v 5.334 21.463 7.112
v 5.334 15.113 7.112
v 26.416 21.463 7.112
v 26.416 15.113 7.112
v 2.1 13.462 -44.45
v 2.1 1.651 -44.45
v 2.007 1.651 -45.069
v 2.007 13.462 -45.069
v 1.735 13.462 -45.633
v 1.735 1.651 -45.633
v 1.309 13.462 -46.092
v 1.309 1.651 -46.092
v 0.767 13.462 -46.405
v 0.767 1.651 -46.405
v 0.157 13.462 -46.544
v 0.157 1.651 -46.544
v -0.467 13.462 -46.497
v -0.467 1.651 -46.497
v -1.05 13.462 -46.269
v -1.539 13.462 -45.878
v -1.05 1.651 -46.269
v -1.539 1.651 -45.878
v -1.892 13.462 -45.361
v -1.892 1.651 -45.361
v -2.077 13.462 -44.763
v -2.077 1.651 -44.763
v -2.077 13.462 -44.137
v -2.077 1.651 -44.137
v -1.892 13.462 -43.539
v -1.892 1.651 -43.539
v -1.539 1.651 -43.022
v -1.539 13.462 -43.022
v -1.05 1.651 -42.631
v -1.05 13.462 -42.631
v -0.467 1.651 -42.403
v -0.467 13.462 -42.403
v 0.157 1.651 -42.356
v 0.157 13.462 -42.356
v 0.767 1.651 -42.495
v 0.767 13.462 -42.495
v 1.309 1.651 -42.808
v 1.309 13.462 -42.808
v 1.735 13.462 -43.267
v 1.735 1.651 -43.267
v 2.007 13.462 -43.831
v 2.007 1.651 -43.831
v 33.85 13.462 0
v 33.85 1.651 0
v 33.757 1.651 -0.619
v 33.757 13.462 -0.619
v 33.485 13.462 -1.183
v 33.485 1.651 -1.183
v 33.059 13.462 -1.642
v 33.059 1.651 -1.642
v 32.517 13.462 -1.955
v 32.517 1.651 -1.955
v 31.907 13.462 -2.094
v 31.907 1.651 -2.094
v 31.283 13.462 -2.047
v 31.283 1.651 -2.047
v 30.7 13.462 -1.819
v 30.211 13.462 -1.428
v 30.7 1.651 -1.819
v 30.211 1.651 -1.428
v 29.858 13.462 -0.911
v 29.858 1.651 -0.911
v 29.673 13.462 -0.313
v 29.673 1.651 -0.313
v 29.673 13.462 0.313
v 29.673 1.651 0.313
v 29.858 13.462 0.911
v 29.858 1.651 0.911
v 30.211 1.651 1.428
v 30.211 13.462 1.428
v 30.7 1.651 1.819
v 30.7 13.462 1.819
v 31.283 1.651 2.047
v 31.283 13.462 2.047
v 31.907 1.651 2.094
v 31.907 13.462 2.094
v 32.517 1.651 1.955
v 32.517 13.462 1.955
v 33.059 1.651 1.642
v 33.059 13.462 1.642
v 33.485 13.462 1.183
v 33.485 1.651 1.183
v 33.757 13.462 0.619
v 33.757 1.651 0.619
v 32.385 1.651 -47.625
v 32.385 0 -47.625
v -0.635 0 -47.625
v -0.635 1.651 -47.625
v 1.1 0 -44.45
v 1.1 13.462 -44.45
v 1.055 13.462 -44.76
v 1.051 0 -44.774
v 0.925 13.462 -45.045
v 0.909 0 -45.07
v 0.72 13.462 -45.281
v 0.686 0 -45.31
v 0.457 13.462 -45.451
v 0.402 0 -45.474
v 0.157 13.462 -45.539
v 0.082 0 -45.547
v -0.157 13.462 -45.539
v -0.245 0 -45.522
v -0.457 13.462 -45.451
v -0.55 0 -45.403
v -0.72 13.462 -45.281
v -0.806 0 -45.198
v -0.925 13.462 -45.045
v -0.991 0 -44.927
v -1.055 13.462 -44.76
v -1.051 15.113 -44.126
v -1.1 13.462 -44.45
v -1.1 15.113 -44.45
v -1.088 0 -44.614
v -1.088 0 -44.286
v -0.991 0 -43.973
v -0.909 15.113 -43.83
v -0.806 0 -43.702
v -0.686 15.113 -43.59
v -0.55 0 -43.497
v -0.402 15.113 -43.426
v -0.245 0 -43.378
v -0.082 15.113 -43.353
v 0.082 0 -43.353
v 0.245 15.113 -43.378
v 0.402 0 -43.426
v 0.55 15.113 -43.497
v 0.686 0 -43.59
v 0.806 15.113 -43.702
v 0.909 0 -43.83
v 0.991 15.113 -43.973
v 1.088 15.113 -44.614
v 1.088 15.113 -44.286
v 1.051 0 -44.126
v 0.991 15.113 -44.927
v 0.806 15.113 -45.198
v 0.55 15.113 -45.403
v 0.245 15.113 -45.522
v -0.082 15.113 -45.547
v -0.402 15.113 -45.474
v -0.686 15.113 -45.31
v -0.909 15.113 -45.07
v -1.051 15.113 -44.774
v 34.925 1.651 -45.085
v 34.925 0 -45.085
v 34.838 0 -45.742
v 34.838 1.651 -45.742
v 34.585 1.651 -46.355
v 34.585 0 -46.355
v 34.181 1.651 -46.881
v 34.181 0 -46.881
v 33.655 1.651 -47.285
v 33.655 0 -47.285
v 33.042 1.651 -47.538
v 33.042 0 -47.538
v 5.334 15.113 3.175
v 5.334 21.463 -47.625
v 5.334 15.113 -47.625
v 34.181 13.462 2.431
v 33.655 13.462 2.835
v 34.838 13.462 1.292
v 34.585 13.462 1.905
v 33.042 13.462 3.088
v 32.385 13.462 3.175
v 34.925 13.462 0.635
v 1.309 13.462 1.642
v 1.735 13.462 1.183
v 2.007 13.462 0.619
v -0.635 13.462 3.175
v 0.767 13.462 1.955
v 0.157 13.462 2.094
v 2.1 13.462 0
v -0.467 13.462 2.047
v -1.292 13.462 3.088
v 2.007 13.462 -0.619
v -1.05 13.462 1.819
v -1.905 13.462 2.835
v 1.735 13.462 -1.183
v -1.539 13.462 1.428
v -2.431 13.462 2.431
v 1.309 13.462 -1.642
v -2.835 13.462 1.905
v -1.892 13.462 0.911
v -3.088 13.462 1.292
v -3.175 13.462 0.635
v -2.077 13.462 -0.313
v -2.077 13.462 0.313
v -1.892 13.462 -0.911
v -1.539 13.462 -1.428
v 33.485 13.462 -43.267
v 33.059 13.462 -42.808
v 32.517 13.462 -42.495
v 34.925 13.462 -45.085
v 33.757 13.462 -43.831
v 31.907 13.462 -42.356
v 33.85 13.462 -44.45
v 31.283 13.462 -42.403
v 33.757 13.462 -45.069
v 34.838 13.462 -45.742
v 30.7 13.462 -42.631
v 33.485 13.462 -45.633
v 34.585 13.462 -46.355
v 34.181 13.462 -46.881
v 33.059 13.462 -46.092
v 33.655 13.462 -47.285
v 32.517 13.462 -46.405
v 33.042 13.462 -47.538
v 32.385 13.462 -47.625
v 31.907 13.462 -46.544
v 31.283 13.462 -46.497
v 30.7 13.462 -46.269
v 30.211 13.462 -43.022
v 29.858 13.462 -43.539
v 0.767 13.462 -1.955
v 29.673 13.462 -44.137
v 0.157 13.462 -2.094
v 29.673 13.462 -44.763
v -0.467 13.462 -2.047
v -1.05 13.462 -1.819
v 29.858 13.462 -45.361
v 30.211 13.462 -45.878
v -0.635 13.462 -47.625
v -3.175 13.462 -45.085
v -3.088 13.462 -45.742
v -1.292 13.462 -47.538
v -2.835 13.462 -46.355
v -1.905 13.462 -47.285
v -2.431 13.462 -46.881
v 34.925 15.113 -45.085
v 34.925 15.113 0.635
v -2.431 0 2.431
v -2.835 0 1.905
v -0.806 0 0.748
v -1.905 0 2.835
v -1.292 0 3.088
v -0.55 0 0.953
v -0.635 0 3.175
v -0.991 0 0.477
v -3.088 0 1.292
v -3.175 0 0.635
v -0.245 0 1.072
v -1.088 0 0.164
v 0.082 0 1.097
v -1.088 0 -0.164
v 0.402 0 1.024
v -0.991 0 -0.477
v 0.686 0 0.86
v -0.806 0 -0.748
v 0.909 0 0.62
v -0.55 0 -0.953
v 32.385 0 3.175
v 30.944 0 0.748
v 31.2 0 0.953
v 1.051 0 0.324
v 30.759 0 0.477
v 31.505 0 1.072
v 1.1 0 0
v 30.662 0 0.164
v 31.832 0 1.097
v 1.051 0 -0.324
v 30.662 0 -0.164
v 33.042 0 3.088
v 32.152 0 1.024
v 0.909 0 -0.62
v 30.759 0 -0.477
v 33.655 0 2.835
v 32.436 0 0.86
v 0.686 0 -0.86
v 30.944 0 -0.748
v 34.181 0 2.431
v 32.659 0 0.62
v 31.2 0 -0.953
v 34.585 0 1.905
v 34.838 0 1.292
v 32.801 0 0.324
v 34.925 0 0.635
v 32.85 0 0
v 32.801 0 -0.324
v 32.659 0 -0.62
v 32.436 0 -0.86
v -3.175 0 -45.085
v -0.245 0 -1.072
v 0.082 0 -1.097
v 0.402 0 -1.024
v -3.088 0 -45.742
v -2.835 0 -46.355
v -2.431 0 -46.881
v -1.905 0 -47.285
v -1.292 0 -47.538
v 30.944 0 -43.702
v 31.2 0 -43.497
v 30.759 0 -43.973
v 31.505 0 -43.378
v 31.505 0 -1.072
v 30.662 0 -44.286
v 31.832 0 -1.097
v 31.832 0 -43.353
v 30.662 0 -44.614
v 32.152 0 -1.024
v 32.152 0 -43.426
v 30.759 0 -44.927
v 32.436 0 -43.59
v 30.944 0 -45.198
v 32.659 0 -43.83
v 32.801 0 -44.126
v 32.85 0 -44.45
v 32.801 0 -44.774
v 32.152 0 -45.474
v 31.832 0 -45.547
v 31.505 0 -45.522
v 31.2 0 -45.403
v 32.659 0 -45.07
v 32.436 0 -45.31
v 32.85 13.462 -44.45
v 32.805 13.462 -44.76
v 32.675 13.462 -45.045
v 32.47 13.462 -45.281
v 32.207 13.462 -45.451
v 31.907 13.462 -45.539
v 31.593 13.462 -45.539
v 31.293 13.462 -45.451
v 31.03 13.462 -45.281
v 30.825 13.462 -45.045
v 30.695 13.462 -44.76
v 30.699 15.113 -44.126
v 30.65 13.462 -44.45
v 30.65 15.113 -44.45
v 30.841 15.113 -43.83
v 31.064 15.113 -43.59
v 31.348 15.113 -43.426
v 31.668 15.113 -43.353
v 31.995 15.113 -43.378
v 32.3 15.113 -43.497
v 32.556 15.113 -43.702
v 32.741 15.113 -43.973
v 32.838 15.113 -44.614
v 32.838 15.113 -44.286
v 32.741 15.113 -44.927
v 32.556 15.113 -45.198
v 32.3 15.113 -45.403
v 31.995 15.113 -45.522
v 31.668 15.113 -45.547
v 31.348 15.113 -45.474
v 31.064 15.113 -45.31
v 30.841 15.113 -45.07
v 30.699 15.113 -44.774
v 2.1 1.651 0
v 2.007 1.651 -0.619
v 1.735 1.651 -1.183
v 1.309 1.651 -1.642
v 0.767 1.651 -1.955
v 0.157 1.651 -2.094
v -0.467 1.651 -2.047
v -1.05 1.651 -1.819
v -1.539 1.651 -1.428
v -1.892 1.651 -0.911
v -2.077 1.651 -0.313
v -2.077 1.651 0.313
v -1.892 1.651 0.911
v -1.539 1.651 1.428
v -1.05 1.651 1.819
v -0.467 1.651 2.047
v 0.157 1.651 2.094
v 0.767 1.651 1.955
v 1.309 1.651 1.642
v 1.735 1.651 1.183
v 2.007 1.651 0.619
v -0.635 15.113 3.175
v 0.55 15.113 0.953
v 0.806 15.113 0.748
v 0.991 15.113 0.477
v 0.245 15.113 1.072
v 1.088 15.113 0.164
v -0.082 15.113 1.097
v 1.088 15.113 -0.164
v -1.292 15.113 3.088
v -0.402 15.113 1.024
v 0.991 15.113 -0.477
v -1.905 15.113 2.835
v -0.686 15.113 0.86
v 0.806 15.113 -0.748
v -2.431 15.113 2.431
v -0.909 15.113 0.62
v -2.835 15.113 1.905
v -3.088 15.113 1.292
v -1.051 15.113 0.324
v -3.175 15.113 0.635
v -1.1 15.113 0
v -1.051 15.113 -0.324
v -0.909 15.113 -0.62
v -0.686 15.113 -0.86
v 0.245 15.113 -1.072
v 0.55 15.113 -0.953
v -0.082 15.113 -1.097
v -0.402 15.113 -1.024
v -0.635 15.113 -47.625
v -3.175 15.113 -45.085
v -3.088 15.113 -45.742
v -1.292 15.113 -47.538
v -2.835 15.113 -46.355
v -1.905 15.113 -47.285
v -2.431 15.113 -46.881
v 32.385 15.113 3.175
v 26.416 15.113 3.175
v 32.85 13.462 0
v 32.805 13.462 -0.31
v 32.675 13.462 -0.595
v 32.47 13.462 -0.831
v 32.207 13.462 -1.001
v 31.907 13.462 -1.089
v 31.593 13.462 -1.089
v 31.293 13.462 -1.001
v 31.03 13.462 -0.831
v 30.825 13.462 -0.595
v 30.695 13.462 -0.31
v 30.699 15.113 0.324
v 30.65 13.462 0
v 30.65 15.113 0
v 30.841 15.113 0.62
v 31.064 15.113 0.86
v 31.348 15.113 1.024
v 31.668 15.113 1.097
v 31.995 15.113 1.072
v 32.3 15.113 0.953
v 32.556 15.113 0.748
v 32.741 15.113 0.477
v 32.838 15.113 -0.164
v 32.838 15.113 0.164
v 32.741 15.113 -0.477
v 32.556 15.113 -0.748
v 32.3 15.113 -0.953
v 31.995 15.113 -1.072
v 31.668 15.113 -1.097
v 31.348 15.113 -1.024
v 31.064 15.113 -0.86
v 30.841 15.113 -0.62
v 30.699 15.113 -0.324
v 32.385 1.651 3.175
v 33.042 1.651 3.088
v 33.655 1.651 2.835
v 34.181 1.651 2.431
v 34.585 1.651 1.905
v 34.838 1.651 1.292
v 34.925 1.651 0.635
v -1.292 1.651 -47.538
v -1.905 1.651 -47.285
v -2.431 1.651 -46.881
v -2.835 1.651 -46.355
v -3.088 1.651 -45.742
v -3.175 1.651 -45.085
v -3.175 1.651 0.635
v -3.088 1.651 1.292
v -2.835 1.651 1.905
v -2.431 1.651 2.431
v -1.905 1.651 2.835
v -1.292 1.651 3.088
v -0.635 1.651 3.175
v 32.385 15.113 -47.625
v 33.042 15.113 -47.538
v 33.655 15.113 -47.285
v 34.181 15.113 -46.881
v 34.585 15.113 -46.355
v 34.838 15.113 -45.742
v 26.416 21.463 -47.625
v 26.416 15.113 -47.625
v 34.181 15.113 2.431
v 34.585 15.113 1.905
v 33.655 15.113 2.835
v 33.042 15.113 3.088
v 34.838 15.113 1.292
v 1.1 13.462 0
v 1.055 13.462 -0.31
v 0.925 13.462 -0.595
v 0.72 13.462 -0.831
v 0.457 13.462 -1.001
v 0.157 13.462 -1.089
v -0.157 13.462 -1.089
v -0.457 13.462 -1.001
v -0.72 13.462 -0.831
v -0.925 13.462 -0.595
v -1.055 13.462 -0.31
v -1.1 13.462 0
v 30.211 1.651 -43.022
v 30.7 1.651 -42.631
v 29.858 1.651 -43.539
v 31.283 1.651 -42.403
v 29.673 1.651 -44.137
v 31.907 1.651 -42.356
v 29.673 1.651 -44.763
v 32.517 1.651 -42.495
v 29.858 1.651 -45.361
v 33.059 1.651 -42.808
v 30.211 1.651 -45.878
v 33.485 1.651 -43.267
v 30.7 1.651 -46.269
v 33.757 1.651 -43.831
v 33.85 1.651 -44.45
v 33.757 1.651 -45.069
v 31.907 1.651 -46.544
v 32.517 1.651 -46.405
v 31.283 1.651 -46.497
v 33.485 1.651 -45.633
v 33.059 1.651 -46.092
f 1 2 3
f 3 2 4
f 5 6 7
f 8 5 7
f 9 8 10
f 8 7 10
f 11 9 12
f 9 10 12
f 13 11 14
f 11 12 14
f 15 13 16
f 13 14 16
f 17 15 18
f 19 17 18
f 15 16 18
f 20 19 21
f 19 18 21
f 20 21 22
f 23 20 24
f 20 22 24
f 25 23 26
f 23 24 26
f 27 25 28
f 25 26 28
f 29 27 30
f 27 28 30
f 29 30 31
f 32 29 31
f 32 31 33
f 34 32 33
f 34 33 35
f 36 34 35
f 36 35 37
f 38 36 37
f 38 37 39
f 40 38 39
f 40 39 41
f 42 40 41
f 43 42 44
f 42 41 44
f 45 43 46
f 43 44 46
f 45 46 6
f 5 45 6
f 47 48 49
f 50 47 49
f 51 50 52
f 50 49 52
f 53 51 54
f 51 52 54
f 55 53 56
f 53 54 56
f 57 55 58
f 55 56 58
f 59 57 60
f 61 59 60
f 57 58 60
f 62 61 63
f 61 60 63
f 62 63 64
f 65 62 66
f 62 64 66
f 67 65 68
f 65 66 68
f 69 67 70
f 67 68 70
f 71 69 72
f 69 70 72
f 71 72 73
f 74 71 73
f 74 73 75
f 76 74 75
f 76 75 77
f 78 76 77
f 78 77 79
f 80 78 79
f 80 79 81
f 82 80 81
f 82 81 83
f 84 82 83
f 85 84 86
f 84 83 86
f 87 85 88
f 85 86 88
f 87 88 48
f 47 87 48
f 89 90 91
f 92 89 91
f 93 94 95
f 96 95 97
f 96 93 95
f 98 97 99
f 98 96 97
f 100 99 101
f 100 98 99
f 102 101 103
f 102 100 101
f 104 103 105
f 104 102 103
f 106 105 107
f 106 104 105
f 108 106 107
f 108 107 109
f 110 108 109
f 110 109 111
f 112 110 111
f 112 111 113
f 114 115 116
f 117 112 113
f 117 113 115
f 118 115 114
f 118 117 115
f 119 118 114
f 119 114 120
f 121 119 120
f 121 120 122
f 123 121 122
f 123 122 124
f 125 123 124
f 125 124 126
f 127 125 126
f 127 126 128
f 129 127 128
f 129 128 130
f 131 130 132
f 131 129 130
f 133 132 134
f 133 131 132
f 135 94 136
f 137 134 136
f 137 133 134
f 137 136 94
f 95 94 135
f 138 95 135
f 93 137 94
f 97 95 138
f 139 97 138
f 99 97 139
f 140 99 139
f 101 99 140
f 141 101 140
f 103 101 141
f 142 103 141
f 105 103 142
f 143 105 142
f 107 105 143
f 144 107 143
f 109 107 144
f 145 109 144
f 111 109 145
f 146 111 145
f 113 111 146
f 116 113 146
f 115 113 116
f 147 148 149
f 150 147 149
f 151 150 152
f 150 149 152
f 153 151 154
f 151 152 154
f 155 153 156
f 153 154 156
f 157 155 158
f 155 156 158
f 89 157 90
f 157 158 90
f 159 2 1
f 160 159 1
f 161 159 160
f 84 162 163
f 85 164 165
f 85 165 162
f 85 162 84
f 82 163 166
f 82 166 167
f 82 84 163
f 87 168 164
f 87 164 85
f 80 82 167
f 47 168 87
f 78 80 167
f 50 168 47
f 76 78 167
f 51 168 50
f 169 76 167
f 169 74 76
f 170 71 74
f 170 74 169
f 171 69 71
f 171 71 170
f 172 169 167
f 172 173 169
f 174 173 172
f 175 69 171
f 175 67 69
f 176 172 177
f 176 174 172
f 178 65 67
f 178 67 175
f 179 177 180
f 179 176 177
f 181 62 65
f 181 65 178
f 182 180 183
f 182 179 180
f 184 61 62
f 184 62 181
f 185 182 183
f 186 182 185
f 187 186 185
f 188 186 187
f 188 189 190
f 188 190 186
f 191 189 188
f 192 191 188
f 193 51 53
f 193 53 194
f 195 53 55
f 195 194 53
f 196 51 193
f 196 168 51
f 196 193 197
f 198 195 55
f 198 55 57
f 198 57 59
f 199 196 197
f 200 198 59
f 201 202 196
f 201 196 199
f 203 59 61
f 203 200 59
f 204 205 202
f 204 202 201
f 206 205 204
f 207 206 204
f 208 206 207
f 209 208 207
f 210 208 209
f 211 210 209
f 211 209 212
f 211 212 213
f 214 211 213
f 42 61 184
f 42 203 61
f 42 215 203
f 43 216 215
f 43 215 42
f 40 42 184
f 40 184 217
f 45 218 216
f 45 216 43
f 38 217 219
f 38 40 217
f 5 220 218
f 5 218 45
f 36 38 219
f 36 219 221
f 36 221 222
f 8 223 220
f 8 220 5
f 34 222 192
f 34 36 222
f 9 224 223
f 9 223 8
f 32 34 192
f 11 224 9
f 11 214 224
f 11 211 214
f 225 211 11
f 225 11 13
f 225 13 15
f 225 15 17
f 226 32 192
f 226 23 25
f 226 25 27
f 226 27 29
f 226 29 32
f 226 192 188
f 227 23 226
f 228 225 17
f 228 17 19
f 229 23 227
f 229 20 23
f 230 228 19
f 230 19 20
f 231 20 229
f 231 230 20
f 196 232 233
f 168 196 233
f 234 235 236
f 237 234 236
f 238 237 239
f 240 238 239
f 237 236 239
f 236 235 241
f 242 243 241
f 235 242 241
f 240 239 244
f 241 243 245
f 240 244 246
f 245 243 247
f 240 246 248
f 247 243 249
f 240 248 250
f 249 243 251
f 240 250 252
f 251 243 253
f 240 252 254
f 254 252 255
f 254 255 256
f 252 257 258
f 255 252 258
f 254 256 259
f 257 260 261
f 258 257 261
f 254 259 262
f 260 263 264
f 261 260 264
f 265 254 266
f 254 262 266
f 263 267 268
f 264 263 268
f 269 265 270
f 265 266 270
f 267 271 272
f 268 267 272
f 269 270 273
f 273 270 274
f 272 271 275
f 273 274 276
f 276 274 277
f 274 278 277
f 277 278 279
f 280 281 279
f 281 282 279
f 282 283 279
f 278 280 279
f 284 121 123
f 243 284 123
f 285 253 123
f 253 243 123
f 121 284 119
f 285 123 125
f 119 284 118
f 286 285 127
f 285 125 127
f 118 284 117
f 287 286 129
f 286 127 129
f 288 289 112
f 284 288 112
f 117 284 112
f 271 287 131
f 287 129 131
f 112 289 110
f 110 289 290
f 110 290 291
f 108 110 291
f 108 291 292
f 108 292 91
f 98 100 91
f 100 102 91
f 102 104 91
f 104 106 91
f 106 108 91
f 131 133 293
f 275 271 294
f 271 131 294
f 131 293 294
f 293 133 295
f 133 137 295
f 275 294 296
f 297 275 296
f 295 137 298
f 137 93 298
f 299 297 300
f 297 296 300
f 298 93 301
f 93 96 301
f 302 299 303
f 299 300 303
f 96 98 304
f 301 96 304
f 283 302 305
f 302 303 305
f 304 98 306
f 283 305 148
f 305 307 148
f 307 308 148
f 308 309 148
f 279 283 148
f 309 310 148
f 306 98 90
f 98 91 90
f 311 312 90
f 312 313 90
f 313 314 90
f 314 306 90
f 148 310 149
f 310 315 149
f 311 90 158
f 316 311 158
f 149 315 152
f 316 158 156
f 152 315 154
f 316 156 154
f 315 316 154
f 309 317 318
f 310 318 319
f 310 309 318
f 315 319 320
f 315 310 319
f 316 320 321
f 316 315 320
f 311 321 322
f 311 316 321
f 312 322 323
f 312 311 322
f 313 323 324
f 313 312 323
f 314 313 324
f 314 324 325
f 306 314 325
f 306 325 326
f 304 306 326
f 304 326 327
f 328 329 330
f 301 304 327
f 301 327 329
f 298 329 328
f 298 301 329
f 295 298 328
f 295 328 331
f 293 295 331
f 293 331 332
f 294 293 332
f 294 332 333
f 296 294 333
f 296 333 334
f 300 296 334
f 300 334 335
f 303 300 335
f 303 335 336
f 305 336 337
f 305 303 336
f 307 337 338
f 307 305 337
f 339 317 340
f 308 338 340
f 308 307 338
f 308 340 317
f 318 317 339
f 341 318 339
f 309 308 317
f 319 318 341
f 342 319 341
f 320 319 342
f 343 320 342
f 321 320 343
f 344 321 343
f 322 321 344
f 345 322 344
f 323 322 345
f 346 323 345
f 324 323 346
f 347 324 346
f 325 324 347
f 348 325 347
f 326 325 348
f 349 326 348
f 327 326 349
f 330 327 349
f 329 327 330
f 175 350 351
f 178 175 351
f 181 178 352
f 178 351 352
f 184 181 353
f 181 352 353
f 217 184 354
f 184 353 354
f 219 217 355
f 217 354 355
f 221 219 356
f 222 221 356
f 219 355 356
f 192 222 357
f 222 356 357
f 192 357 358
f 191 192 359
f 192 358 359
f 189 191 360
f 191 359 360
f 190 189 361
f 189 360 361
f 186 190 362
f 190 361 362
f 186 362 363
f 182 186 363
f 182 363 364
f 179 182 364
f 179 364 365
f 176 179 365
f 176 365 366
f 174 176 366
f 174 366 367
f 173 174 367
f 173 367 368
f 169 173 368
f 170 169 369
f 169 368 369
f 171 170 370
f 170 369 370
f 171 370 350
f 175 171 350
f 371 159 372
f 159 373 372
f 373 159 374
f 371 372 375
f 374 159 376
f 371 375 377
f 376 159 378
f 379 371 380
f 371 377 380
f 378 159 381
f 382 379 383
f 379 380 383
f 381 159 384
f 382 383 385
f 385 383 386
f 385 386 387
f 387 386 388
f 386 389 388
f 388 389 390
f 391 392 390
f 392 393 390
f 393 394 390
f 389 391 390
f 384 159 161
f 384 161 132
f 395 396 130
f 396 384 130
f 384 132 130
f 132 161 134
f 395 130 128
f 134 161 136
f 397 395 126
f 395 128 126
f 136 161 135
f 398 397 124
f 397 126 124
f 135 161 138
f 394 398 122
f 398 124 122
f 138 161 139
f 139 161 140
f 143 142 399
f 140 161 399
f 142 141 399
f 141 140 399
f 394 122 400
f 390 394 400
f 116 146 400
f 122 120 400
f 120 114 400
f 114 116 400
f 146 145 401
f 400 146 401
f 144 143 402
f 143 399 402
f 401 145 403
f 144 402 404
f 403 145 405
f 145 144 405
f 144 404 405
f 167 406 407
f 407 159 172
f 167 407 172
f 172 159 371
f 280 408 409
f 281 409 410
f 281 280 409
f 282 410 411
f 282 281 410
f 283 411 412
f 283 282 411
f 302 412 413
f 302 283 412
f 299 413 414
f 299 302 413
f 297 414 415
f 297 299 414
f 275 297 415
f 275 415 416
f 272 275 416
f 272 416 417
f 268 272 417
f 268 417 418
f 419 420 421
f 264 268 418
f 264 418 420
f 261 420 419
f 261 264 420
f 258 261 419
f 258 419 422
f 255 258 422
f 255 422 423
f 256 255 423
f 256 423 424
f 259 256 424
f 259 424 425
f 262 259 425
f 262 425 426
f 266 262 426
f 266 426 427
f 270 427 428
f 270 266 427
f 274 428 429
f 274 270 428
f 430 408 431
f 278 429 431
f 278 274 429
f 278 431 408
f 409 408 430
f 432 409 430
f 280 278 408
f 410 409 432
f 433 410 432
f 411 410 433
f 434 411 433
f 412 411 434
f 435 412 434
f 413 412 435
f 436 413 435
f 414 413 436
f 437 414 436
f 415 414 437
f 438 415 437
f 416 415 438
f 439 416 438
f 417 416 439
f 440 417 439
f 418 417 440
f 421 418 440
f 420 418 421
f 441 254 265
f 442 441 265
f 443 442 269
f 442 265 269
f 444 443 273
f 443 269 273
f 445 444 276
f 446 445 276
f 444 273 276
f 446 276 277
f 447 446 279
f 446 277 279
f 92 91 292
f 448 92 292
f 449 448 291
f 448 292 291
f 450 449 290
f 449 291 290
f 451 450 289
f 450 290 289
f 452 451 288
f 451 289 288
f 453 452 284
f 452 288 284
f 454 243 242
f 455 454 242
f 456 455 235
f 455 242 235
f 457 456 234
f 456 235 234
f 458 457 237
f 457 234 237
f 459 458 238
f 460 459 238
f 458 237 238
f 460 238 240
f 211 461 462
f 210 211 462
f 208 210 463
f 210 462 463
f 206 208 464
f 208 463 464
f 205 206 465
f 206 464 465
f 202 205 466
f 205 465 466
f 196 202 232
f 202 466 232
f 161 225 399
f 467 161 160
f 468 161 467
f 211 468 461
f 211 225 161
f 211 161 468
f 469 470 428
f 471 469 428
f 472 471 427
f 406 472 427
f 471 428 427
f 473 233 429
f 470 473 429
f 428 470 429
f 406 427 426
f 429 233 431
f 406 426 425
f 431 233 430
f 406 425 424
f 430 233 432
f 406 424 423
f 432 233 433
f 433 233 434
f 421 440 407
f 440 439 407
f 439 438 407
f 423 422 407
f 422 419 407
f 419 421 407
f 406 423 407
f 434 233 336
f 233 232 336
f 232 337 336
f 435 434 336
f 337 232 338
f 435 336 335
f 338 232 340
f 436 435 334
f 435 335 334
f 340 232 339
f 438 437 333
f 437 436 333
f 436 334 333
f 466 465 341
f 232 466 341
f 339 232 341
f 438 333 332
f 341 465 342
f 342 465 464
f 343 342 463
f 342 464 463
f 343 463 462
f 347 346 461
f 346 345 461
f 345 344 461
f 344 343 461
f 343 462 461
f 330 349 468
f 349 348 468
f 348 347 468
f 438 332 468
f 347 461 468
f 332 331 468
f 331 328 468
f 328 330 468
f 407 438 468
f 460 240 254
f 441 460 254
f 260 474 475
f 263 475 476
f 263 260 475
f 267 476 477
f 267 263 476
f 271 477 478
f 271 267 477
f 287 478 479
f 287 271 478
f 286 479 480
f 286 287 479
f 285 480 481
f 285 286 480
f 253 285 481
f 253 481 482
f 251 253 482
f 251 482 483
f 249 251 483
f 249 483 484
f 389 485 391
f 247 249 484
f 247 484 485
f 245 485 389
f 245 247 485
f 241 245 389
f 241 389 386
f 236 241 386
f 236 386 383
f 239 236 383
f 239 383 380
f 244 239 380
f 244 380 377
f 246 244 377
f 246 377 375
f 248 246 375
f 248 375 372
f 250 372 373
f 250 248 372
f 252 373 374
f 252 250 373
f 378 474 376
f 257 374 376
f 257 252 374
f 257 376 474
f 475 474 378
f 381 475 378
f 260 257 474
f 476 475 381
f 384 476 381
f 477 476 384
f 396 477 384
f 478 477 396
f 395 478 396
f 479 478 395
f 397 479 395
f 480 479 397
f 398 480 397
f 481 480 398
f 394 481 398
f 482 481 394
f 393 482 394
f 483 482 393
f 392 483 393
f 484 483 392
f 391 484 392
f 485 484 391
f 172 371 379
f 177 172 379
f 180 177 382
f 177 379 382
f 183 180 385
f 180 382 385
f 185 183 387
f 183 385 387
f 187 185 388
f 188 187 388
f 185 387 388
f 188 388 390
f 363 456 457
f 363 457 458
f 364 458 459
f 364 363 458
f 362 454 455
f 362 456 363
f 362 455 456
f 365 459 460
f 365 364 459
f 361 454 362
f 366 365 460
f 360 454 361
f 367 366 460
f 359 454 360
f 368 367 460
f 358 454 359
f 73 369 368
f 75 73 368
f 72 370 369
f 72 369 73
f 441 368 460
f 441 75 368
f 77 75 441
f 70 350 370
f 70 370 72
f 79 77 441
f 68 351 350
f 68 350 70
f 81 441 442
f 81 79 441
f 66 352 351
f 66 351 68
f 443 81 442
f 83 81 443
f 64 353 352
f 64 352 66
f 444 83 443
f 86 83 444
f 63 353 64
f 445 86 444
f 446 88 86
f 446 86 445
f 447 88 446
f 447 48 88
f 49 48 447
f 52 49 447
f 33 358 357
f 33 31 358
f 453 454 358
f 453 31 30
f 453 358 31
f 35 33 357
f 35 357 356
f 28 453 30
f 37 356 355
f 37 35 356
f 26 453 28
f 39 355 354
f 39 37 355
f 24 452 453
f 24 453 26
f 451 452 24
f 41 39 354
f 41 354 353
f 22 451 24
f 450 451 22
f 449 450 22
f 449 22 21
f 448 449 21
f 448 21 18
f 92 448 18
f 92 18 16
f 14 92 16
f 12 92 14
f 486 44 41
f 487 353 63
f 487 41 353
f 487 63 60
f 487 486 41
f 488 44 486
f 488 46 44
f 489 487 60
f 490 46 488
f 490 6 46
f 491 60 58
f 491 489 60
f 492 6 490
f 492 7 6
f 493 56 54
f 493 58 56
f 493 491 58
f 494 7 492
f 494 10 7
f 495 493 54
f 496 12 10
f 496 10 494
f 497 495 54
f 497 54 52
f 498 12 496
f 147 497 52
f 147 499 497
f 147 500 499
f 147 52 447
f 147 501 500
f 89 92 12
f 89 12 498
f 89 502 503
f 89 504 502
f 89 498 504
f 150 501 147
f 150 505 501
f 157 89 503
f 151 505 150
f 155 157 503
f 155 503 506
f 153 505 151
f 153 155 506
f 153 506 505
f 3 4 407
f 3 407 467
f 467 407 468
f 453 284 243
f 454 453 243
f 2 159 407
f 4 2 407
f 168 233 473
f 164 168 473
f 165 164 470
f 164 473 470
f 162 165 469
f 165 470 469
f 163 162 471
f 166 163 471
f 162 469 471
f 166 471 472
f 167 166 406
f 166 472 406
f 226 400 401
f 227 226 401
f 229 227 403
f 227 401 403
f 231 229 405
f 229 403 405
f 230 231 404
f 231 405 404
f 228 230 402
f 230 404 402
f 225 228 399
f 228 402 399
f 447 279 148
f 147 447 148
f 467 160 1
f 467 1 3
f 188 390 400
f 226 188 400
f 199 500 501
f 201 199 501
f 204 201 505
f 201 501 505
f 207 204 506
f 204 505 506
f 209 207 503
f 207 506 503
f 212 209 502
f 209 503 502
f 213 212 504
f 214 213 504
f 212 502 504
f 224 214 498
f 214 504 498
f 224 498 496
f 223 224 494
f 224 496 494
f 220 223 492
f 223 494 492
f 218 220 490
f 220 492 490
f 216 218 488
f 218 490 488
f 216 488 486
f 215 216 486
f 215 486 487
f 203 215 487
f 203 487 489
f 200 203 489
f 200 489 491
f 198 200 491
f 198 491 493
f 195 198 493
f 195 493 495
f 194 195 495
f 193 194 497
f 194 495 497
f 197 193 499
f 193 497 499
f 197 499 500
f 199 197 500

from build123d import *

# Parameters (mm, degrees)
SKETCH1_R           = 1.1
BOSS_EXTRUDE1_DEPTH = 1.651
SKETCH2_R           = 1.1
BOSS_EXTRUDE2_DEPTH = 1.651
SKETCH3_R           = 2.1
SKETCH3_R_2         = 1.1
BOSS_EXTRUDE3_DEPTH = 11.811
SKETCH4_W           = 21.082
SKETCH4_H           = 54.737
BOSS_EXTRUDE4_DEPTH = 6.35


with BuildPart() as part:
    # Sketch1 → Boss-Extrude1 (new body)
    with BuildSketch(Plane(origin=(0, 0, 0), x_dir=(1, 0, 0), z_dir=(0, 1, 0))):
        with BuildLine():
            Line((-0.635, -3.175), (32.385, -3.175))
            ThreePointArc((32.385, -3.175), (34.181051224, -2.431051224), (34.925, -0.635))
            Line((34.925, -0.635), (34.925, 45.085))
            ThreePointArc((34.925, 45.085), (34.181051224, 46.881051224), (32.385, 47.625))
            Line((32.385, 47.625), (-0.635, 47.625))
            ThreePointArc((-0.635, 47.625), (-2.431051224, 46.881051224), (-3.175, 45.085))
            Line((-3.175, 45.085), (-3.175, -0.635))
            ThreePointArc((-3.175, -0.635), (-2.431051224, -2.431051224), (-0.635, -3.175))
        make_face()
        with Locations((0, 44.45)):
            Circle(SKETCH1_R, mode=Mode.SUBTRACT)
        with Locations((31.75, 44.45)):
            Circle(SKETCH1_R, mode=Mode.SUBTRACT)
        with Locations((31.75, 0)):
            Circle(SKETCH1_R, mode=Mode.SUBTRACT)
        Circle(SKETCH1_R, mode=Mode.SUBTRACT)
    extrude(amount=BOSS_EXTRUDE1_DEPTH)



with BuildPart() as body_2:
    # Sketch2 → Boss-Extrude2 (new body)
    with BuildSketch(Plane(origin=(0, 15.113, 0), x_dir=(-1, 0, 0), z_dir=(0, -1, 0))):
        with BuildLine():
            Line((3.175, -0.635), (3.175, 45.085))
            ThreePointArc((3.175, 45.085), (2.431051224, 46.881051224), (0.635, 47.625))
            Line((0.635, 47.625), (-32.385, 47.625))
            ThreePointArc((-32.385, 47.625), (-34.181051224, 46.881051224), (-34.925, 45.085))
            Line((-34.925, 45.085), (-34.925, -0.635))
            ThreePointArc((-34.925, -0.635), (-34.181051224, -2.431051224), (-32.385, -3.175))
            Line((-32.385, -3.175), (0.635, -3.175))
            ThreePointArc((0.635, -3.175), (2.431051224, -2.431051224), (3.175, -0.635))
        make_face()
        with Locations((-31.75, 44.45)):
            Circle(SKETCH2_R, mode=Mode.SUBTRACT)
        with Locations((0, 44.45)):
            Circle(SKETCH2_R, mode=Mode.SUBTRACT)
        with Locations((-31.75, 0)):
            Circle(SKETCH2_R, mode=Mode.SUBTRACT)
        Circle(SKETCH2_R, mode=Mode.SUBTRACT)
    extrude(amount=BOSS_EXTRUDE2_DEPTH)


with BuildPart() as part_1:
    add(part.part)

    add(body_2.part)  # Boss-Extrude3 merges body 2
    # Sketch3 → Boss-Extrude3 (add)
    with BuildSketch(Plane(origin=(0, 1.651, 0), x_dir=(1, 0, 0), z_dir=(0, 1, 0))):
        Circle(SKETCH3_R)
        Circle(SKETCH3_R_2, mode=Mode.SUBTRACT)
        with Locations((31.75, 0)):
            Circle(SKETCH3_R)
        with Locations((31.75, 0)):
            Circle(SKETCH3_R_2, mode=Mode.SUBTRACT)
        with Locations((31.75, 44.45)):
            Circle(SKETCH3_R)
        with Locations((31.75, 44.45)):
            Circle(SKETCH3_R_2, mode=Mode.SUBTRACT)
        with Locations((0, 44.45)):
            Circle(SKETCH3_R)
        with Locations((0, 44.45)):
            Circle(SKETCH3_R_2, mode=Mode.SUBTRACT)
    extrude(amount=BOSS_EXTRUDE3_DEPTH)

    # Sketch4 → Boss-Extrude4 (add)
    with BuildSketch(Plane(origin=(0, 15.113, 0), x_dir=(1, 0, 0), z_dir=(0, 1, 0))):
        with Locations((15.875, 20.2565)):
            Rectangle(SKETCH4_W, SKETCH4_H)
    extrude(amount=BOSS_EXTRUDE4_DEPTH)


solid = part_1.part
